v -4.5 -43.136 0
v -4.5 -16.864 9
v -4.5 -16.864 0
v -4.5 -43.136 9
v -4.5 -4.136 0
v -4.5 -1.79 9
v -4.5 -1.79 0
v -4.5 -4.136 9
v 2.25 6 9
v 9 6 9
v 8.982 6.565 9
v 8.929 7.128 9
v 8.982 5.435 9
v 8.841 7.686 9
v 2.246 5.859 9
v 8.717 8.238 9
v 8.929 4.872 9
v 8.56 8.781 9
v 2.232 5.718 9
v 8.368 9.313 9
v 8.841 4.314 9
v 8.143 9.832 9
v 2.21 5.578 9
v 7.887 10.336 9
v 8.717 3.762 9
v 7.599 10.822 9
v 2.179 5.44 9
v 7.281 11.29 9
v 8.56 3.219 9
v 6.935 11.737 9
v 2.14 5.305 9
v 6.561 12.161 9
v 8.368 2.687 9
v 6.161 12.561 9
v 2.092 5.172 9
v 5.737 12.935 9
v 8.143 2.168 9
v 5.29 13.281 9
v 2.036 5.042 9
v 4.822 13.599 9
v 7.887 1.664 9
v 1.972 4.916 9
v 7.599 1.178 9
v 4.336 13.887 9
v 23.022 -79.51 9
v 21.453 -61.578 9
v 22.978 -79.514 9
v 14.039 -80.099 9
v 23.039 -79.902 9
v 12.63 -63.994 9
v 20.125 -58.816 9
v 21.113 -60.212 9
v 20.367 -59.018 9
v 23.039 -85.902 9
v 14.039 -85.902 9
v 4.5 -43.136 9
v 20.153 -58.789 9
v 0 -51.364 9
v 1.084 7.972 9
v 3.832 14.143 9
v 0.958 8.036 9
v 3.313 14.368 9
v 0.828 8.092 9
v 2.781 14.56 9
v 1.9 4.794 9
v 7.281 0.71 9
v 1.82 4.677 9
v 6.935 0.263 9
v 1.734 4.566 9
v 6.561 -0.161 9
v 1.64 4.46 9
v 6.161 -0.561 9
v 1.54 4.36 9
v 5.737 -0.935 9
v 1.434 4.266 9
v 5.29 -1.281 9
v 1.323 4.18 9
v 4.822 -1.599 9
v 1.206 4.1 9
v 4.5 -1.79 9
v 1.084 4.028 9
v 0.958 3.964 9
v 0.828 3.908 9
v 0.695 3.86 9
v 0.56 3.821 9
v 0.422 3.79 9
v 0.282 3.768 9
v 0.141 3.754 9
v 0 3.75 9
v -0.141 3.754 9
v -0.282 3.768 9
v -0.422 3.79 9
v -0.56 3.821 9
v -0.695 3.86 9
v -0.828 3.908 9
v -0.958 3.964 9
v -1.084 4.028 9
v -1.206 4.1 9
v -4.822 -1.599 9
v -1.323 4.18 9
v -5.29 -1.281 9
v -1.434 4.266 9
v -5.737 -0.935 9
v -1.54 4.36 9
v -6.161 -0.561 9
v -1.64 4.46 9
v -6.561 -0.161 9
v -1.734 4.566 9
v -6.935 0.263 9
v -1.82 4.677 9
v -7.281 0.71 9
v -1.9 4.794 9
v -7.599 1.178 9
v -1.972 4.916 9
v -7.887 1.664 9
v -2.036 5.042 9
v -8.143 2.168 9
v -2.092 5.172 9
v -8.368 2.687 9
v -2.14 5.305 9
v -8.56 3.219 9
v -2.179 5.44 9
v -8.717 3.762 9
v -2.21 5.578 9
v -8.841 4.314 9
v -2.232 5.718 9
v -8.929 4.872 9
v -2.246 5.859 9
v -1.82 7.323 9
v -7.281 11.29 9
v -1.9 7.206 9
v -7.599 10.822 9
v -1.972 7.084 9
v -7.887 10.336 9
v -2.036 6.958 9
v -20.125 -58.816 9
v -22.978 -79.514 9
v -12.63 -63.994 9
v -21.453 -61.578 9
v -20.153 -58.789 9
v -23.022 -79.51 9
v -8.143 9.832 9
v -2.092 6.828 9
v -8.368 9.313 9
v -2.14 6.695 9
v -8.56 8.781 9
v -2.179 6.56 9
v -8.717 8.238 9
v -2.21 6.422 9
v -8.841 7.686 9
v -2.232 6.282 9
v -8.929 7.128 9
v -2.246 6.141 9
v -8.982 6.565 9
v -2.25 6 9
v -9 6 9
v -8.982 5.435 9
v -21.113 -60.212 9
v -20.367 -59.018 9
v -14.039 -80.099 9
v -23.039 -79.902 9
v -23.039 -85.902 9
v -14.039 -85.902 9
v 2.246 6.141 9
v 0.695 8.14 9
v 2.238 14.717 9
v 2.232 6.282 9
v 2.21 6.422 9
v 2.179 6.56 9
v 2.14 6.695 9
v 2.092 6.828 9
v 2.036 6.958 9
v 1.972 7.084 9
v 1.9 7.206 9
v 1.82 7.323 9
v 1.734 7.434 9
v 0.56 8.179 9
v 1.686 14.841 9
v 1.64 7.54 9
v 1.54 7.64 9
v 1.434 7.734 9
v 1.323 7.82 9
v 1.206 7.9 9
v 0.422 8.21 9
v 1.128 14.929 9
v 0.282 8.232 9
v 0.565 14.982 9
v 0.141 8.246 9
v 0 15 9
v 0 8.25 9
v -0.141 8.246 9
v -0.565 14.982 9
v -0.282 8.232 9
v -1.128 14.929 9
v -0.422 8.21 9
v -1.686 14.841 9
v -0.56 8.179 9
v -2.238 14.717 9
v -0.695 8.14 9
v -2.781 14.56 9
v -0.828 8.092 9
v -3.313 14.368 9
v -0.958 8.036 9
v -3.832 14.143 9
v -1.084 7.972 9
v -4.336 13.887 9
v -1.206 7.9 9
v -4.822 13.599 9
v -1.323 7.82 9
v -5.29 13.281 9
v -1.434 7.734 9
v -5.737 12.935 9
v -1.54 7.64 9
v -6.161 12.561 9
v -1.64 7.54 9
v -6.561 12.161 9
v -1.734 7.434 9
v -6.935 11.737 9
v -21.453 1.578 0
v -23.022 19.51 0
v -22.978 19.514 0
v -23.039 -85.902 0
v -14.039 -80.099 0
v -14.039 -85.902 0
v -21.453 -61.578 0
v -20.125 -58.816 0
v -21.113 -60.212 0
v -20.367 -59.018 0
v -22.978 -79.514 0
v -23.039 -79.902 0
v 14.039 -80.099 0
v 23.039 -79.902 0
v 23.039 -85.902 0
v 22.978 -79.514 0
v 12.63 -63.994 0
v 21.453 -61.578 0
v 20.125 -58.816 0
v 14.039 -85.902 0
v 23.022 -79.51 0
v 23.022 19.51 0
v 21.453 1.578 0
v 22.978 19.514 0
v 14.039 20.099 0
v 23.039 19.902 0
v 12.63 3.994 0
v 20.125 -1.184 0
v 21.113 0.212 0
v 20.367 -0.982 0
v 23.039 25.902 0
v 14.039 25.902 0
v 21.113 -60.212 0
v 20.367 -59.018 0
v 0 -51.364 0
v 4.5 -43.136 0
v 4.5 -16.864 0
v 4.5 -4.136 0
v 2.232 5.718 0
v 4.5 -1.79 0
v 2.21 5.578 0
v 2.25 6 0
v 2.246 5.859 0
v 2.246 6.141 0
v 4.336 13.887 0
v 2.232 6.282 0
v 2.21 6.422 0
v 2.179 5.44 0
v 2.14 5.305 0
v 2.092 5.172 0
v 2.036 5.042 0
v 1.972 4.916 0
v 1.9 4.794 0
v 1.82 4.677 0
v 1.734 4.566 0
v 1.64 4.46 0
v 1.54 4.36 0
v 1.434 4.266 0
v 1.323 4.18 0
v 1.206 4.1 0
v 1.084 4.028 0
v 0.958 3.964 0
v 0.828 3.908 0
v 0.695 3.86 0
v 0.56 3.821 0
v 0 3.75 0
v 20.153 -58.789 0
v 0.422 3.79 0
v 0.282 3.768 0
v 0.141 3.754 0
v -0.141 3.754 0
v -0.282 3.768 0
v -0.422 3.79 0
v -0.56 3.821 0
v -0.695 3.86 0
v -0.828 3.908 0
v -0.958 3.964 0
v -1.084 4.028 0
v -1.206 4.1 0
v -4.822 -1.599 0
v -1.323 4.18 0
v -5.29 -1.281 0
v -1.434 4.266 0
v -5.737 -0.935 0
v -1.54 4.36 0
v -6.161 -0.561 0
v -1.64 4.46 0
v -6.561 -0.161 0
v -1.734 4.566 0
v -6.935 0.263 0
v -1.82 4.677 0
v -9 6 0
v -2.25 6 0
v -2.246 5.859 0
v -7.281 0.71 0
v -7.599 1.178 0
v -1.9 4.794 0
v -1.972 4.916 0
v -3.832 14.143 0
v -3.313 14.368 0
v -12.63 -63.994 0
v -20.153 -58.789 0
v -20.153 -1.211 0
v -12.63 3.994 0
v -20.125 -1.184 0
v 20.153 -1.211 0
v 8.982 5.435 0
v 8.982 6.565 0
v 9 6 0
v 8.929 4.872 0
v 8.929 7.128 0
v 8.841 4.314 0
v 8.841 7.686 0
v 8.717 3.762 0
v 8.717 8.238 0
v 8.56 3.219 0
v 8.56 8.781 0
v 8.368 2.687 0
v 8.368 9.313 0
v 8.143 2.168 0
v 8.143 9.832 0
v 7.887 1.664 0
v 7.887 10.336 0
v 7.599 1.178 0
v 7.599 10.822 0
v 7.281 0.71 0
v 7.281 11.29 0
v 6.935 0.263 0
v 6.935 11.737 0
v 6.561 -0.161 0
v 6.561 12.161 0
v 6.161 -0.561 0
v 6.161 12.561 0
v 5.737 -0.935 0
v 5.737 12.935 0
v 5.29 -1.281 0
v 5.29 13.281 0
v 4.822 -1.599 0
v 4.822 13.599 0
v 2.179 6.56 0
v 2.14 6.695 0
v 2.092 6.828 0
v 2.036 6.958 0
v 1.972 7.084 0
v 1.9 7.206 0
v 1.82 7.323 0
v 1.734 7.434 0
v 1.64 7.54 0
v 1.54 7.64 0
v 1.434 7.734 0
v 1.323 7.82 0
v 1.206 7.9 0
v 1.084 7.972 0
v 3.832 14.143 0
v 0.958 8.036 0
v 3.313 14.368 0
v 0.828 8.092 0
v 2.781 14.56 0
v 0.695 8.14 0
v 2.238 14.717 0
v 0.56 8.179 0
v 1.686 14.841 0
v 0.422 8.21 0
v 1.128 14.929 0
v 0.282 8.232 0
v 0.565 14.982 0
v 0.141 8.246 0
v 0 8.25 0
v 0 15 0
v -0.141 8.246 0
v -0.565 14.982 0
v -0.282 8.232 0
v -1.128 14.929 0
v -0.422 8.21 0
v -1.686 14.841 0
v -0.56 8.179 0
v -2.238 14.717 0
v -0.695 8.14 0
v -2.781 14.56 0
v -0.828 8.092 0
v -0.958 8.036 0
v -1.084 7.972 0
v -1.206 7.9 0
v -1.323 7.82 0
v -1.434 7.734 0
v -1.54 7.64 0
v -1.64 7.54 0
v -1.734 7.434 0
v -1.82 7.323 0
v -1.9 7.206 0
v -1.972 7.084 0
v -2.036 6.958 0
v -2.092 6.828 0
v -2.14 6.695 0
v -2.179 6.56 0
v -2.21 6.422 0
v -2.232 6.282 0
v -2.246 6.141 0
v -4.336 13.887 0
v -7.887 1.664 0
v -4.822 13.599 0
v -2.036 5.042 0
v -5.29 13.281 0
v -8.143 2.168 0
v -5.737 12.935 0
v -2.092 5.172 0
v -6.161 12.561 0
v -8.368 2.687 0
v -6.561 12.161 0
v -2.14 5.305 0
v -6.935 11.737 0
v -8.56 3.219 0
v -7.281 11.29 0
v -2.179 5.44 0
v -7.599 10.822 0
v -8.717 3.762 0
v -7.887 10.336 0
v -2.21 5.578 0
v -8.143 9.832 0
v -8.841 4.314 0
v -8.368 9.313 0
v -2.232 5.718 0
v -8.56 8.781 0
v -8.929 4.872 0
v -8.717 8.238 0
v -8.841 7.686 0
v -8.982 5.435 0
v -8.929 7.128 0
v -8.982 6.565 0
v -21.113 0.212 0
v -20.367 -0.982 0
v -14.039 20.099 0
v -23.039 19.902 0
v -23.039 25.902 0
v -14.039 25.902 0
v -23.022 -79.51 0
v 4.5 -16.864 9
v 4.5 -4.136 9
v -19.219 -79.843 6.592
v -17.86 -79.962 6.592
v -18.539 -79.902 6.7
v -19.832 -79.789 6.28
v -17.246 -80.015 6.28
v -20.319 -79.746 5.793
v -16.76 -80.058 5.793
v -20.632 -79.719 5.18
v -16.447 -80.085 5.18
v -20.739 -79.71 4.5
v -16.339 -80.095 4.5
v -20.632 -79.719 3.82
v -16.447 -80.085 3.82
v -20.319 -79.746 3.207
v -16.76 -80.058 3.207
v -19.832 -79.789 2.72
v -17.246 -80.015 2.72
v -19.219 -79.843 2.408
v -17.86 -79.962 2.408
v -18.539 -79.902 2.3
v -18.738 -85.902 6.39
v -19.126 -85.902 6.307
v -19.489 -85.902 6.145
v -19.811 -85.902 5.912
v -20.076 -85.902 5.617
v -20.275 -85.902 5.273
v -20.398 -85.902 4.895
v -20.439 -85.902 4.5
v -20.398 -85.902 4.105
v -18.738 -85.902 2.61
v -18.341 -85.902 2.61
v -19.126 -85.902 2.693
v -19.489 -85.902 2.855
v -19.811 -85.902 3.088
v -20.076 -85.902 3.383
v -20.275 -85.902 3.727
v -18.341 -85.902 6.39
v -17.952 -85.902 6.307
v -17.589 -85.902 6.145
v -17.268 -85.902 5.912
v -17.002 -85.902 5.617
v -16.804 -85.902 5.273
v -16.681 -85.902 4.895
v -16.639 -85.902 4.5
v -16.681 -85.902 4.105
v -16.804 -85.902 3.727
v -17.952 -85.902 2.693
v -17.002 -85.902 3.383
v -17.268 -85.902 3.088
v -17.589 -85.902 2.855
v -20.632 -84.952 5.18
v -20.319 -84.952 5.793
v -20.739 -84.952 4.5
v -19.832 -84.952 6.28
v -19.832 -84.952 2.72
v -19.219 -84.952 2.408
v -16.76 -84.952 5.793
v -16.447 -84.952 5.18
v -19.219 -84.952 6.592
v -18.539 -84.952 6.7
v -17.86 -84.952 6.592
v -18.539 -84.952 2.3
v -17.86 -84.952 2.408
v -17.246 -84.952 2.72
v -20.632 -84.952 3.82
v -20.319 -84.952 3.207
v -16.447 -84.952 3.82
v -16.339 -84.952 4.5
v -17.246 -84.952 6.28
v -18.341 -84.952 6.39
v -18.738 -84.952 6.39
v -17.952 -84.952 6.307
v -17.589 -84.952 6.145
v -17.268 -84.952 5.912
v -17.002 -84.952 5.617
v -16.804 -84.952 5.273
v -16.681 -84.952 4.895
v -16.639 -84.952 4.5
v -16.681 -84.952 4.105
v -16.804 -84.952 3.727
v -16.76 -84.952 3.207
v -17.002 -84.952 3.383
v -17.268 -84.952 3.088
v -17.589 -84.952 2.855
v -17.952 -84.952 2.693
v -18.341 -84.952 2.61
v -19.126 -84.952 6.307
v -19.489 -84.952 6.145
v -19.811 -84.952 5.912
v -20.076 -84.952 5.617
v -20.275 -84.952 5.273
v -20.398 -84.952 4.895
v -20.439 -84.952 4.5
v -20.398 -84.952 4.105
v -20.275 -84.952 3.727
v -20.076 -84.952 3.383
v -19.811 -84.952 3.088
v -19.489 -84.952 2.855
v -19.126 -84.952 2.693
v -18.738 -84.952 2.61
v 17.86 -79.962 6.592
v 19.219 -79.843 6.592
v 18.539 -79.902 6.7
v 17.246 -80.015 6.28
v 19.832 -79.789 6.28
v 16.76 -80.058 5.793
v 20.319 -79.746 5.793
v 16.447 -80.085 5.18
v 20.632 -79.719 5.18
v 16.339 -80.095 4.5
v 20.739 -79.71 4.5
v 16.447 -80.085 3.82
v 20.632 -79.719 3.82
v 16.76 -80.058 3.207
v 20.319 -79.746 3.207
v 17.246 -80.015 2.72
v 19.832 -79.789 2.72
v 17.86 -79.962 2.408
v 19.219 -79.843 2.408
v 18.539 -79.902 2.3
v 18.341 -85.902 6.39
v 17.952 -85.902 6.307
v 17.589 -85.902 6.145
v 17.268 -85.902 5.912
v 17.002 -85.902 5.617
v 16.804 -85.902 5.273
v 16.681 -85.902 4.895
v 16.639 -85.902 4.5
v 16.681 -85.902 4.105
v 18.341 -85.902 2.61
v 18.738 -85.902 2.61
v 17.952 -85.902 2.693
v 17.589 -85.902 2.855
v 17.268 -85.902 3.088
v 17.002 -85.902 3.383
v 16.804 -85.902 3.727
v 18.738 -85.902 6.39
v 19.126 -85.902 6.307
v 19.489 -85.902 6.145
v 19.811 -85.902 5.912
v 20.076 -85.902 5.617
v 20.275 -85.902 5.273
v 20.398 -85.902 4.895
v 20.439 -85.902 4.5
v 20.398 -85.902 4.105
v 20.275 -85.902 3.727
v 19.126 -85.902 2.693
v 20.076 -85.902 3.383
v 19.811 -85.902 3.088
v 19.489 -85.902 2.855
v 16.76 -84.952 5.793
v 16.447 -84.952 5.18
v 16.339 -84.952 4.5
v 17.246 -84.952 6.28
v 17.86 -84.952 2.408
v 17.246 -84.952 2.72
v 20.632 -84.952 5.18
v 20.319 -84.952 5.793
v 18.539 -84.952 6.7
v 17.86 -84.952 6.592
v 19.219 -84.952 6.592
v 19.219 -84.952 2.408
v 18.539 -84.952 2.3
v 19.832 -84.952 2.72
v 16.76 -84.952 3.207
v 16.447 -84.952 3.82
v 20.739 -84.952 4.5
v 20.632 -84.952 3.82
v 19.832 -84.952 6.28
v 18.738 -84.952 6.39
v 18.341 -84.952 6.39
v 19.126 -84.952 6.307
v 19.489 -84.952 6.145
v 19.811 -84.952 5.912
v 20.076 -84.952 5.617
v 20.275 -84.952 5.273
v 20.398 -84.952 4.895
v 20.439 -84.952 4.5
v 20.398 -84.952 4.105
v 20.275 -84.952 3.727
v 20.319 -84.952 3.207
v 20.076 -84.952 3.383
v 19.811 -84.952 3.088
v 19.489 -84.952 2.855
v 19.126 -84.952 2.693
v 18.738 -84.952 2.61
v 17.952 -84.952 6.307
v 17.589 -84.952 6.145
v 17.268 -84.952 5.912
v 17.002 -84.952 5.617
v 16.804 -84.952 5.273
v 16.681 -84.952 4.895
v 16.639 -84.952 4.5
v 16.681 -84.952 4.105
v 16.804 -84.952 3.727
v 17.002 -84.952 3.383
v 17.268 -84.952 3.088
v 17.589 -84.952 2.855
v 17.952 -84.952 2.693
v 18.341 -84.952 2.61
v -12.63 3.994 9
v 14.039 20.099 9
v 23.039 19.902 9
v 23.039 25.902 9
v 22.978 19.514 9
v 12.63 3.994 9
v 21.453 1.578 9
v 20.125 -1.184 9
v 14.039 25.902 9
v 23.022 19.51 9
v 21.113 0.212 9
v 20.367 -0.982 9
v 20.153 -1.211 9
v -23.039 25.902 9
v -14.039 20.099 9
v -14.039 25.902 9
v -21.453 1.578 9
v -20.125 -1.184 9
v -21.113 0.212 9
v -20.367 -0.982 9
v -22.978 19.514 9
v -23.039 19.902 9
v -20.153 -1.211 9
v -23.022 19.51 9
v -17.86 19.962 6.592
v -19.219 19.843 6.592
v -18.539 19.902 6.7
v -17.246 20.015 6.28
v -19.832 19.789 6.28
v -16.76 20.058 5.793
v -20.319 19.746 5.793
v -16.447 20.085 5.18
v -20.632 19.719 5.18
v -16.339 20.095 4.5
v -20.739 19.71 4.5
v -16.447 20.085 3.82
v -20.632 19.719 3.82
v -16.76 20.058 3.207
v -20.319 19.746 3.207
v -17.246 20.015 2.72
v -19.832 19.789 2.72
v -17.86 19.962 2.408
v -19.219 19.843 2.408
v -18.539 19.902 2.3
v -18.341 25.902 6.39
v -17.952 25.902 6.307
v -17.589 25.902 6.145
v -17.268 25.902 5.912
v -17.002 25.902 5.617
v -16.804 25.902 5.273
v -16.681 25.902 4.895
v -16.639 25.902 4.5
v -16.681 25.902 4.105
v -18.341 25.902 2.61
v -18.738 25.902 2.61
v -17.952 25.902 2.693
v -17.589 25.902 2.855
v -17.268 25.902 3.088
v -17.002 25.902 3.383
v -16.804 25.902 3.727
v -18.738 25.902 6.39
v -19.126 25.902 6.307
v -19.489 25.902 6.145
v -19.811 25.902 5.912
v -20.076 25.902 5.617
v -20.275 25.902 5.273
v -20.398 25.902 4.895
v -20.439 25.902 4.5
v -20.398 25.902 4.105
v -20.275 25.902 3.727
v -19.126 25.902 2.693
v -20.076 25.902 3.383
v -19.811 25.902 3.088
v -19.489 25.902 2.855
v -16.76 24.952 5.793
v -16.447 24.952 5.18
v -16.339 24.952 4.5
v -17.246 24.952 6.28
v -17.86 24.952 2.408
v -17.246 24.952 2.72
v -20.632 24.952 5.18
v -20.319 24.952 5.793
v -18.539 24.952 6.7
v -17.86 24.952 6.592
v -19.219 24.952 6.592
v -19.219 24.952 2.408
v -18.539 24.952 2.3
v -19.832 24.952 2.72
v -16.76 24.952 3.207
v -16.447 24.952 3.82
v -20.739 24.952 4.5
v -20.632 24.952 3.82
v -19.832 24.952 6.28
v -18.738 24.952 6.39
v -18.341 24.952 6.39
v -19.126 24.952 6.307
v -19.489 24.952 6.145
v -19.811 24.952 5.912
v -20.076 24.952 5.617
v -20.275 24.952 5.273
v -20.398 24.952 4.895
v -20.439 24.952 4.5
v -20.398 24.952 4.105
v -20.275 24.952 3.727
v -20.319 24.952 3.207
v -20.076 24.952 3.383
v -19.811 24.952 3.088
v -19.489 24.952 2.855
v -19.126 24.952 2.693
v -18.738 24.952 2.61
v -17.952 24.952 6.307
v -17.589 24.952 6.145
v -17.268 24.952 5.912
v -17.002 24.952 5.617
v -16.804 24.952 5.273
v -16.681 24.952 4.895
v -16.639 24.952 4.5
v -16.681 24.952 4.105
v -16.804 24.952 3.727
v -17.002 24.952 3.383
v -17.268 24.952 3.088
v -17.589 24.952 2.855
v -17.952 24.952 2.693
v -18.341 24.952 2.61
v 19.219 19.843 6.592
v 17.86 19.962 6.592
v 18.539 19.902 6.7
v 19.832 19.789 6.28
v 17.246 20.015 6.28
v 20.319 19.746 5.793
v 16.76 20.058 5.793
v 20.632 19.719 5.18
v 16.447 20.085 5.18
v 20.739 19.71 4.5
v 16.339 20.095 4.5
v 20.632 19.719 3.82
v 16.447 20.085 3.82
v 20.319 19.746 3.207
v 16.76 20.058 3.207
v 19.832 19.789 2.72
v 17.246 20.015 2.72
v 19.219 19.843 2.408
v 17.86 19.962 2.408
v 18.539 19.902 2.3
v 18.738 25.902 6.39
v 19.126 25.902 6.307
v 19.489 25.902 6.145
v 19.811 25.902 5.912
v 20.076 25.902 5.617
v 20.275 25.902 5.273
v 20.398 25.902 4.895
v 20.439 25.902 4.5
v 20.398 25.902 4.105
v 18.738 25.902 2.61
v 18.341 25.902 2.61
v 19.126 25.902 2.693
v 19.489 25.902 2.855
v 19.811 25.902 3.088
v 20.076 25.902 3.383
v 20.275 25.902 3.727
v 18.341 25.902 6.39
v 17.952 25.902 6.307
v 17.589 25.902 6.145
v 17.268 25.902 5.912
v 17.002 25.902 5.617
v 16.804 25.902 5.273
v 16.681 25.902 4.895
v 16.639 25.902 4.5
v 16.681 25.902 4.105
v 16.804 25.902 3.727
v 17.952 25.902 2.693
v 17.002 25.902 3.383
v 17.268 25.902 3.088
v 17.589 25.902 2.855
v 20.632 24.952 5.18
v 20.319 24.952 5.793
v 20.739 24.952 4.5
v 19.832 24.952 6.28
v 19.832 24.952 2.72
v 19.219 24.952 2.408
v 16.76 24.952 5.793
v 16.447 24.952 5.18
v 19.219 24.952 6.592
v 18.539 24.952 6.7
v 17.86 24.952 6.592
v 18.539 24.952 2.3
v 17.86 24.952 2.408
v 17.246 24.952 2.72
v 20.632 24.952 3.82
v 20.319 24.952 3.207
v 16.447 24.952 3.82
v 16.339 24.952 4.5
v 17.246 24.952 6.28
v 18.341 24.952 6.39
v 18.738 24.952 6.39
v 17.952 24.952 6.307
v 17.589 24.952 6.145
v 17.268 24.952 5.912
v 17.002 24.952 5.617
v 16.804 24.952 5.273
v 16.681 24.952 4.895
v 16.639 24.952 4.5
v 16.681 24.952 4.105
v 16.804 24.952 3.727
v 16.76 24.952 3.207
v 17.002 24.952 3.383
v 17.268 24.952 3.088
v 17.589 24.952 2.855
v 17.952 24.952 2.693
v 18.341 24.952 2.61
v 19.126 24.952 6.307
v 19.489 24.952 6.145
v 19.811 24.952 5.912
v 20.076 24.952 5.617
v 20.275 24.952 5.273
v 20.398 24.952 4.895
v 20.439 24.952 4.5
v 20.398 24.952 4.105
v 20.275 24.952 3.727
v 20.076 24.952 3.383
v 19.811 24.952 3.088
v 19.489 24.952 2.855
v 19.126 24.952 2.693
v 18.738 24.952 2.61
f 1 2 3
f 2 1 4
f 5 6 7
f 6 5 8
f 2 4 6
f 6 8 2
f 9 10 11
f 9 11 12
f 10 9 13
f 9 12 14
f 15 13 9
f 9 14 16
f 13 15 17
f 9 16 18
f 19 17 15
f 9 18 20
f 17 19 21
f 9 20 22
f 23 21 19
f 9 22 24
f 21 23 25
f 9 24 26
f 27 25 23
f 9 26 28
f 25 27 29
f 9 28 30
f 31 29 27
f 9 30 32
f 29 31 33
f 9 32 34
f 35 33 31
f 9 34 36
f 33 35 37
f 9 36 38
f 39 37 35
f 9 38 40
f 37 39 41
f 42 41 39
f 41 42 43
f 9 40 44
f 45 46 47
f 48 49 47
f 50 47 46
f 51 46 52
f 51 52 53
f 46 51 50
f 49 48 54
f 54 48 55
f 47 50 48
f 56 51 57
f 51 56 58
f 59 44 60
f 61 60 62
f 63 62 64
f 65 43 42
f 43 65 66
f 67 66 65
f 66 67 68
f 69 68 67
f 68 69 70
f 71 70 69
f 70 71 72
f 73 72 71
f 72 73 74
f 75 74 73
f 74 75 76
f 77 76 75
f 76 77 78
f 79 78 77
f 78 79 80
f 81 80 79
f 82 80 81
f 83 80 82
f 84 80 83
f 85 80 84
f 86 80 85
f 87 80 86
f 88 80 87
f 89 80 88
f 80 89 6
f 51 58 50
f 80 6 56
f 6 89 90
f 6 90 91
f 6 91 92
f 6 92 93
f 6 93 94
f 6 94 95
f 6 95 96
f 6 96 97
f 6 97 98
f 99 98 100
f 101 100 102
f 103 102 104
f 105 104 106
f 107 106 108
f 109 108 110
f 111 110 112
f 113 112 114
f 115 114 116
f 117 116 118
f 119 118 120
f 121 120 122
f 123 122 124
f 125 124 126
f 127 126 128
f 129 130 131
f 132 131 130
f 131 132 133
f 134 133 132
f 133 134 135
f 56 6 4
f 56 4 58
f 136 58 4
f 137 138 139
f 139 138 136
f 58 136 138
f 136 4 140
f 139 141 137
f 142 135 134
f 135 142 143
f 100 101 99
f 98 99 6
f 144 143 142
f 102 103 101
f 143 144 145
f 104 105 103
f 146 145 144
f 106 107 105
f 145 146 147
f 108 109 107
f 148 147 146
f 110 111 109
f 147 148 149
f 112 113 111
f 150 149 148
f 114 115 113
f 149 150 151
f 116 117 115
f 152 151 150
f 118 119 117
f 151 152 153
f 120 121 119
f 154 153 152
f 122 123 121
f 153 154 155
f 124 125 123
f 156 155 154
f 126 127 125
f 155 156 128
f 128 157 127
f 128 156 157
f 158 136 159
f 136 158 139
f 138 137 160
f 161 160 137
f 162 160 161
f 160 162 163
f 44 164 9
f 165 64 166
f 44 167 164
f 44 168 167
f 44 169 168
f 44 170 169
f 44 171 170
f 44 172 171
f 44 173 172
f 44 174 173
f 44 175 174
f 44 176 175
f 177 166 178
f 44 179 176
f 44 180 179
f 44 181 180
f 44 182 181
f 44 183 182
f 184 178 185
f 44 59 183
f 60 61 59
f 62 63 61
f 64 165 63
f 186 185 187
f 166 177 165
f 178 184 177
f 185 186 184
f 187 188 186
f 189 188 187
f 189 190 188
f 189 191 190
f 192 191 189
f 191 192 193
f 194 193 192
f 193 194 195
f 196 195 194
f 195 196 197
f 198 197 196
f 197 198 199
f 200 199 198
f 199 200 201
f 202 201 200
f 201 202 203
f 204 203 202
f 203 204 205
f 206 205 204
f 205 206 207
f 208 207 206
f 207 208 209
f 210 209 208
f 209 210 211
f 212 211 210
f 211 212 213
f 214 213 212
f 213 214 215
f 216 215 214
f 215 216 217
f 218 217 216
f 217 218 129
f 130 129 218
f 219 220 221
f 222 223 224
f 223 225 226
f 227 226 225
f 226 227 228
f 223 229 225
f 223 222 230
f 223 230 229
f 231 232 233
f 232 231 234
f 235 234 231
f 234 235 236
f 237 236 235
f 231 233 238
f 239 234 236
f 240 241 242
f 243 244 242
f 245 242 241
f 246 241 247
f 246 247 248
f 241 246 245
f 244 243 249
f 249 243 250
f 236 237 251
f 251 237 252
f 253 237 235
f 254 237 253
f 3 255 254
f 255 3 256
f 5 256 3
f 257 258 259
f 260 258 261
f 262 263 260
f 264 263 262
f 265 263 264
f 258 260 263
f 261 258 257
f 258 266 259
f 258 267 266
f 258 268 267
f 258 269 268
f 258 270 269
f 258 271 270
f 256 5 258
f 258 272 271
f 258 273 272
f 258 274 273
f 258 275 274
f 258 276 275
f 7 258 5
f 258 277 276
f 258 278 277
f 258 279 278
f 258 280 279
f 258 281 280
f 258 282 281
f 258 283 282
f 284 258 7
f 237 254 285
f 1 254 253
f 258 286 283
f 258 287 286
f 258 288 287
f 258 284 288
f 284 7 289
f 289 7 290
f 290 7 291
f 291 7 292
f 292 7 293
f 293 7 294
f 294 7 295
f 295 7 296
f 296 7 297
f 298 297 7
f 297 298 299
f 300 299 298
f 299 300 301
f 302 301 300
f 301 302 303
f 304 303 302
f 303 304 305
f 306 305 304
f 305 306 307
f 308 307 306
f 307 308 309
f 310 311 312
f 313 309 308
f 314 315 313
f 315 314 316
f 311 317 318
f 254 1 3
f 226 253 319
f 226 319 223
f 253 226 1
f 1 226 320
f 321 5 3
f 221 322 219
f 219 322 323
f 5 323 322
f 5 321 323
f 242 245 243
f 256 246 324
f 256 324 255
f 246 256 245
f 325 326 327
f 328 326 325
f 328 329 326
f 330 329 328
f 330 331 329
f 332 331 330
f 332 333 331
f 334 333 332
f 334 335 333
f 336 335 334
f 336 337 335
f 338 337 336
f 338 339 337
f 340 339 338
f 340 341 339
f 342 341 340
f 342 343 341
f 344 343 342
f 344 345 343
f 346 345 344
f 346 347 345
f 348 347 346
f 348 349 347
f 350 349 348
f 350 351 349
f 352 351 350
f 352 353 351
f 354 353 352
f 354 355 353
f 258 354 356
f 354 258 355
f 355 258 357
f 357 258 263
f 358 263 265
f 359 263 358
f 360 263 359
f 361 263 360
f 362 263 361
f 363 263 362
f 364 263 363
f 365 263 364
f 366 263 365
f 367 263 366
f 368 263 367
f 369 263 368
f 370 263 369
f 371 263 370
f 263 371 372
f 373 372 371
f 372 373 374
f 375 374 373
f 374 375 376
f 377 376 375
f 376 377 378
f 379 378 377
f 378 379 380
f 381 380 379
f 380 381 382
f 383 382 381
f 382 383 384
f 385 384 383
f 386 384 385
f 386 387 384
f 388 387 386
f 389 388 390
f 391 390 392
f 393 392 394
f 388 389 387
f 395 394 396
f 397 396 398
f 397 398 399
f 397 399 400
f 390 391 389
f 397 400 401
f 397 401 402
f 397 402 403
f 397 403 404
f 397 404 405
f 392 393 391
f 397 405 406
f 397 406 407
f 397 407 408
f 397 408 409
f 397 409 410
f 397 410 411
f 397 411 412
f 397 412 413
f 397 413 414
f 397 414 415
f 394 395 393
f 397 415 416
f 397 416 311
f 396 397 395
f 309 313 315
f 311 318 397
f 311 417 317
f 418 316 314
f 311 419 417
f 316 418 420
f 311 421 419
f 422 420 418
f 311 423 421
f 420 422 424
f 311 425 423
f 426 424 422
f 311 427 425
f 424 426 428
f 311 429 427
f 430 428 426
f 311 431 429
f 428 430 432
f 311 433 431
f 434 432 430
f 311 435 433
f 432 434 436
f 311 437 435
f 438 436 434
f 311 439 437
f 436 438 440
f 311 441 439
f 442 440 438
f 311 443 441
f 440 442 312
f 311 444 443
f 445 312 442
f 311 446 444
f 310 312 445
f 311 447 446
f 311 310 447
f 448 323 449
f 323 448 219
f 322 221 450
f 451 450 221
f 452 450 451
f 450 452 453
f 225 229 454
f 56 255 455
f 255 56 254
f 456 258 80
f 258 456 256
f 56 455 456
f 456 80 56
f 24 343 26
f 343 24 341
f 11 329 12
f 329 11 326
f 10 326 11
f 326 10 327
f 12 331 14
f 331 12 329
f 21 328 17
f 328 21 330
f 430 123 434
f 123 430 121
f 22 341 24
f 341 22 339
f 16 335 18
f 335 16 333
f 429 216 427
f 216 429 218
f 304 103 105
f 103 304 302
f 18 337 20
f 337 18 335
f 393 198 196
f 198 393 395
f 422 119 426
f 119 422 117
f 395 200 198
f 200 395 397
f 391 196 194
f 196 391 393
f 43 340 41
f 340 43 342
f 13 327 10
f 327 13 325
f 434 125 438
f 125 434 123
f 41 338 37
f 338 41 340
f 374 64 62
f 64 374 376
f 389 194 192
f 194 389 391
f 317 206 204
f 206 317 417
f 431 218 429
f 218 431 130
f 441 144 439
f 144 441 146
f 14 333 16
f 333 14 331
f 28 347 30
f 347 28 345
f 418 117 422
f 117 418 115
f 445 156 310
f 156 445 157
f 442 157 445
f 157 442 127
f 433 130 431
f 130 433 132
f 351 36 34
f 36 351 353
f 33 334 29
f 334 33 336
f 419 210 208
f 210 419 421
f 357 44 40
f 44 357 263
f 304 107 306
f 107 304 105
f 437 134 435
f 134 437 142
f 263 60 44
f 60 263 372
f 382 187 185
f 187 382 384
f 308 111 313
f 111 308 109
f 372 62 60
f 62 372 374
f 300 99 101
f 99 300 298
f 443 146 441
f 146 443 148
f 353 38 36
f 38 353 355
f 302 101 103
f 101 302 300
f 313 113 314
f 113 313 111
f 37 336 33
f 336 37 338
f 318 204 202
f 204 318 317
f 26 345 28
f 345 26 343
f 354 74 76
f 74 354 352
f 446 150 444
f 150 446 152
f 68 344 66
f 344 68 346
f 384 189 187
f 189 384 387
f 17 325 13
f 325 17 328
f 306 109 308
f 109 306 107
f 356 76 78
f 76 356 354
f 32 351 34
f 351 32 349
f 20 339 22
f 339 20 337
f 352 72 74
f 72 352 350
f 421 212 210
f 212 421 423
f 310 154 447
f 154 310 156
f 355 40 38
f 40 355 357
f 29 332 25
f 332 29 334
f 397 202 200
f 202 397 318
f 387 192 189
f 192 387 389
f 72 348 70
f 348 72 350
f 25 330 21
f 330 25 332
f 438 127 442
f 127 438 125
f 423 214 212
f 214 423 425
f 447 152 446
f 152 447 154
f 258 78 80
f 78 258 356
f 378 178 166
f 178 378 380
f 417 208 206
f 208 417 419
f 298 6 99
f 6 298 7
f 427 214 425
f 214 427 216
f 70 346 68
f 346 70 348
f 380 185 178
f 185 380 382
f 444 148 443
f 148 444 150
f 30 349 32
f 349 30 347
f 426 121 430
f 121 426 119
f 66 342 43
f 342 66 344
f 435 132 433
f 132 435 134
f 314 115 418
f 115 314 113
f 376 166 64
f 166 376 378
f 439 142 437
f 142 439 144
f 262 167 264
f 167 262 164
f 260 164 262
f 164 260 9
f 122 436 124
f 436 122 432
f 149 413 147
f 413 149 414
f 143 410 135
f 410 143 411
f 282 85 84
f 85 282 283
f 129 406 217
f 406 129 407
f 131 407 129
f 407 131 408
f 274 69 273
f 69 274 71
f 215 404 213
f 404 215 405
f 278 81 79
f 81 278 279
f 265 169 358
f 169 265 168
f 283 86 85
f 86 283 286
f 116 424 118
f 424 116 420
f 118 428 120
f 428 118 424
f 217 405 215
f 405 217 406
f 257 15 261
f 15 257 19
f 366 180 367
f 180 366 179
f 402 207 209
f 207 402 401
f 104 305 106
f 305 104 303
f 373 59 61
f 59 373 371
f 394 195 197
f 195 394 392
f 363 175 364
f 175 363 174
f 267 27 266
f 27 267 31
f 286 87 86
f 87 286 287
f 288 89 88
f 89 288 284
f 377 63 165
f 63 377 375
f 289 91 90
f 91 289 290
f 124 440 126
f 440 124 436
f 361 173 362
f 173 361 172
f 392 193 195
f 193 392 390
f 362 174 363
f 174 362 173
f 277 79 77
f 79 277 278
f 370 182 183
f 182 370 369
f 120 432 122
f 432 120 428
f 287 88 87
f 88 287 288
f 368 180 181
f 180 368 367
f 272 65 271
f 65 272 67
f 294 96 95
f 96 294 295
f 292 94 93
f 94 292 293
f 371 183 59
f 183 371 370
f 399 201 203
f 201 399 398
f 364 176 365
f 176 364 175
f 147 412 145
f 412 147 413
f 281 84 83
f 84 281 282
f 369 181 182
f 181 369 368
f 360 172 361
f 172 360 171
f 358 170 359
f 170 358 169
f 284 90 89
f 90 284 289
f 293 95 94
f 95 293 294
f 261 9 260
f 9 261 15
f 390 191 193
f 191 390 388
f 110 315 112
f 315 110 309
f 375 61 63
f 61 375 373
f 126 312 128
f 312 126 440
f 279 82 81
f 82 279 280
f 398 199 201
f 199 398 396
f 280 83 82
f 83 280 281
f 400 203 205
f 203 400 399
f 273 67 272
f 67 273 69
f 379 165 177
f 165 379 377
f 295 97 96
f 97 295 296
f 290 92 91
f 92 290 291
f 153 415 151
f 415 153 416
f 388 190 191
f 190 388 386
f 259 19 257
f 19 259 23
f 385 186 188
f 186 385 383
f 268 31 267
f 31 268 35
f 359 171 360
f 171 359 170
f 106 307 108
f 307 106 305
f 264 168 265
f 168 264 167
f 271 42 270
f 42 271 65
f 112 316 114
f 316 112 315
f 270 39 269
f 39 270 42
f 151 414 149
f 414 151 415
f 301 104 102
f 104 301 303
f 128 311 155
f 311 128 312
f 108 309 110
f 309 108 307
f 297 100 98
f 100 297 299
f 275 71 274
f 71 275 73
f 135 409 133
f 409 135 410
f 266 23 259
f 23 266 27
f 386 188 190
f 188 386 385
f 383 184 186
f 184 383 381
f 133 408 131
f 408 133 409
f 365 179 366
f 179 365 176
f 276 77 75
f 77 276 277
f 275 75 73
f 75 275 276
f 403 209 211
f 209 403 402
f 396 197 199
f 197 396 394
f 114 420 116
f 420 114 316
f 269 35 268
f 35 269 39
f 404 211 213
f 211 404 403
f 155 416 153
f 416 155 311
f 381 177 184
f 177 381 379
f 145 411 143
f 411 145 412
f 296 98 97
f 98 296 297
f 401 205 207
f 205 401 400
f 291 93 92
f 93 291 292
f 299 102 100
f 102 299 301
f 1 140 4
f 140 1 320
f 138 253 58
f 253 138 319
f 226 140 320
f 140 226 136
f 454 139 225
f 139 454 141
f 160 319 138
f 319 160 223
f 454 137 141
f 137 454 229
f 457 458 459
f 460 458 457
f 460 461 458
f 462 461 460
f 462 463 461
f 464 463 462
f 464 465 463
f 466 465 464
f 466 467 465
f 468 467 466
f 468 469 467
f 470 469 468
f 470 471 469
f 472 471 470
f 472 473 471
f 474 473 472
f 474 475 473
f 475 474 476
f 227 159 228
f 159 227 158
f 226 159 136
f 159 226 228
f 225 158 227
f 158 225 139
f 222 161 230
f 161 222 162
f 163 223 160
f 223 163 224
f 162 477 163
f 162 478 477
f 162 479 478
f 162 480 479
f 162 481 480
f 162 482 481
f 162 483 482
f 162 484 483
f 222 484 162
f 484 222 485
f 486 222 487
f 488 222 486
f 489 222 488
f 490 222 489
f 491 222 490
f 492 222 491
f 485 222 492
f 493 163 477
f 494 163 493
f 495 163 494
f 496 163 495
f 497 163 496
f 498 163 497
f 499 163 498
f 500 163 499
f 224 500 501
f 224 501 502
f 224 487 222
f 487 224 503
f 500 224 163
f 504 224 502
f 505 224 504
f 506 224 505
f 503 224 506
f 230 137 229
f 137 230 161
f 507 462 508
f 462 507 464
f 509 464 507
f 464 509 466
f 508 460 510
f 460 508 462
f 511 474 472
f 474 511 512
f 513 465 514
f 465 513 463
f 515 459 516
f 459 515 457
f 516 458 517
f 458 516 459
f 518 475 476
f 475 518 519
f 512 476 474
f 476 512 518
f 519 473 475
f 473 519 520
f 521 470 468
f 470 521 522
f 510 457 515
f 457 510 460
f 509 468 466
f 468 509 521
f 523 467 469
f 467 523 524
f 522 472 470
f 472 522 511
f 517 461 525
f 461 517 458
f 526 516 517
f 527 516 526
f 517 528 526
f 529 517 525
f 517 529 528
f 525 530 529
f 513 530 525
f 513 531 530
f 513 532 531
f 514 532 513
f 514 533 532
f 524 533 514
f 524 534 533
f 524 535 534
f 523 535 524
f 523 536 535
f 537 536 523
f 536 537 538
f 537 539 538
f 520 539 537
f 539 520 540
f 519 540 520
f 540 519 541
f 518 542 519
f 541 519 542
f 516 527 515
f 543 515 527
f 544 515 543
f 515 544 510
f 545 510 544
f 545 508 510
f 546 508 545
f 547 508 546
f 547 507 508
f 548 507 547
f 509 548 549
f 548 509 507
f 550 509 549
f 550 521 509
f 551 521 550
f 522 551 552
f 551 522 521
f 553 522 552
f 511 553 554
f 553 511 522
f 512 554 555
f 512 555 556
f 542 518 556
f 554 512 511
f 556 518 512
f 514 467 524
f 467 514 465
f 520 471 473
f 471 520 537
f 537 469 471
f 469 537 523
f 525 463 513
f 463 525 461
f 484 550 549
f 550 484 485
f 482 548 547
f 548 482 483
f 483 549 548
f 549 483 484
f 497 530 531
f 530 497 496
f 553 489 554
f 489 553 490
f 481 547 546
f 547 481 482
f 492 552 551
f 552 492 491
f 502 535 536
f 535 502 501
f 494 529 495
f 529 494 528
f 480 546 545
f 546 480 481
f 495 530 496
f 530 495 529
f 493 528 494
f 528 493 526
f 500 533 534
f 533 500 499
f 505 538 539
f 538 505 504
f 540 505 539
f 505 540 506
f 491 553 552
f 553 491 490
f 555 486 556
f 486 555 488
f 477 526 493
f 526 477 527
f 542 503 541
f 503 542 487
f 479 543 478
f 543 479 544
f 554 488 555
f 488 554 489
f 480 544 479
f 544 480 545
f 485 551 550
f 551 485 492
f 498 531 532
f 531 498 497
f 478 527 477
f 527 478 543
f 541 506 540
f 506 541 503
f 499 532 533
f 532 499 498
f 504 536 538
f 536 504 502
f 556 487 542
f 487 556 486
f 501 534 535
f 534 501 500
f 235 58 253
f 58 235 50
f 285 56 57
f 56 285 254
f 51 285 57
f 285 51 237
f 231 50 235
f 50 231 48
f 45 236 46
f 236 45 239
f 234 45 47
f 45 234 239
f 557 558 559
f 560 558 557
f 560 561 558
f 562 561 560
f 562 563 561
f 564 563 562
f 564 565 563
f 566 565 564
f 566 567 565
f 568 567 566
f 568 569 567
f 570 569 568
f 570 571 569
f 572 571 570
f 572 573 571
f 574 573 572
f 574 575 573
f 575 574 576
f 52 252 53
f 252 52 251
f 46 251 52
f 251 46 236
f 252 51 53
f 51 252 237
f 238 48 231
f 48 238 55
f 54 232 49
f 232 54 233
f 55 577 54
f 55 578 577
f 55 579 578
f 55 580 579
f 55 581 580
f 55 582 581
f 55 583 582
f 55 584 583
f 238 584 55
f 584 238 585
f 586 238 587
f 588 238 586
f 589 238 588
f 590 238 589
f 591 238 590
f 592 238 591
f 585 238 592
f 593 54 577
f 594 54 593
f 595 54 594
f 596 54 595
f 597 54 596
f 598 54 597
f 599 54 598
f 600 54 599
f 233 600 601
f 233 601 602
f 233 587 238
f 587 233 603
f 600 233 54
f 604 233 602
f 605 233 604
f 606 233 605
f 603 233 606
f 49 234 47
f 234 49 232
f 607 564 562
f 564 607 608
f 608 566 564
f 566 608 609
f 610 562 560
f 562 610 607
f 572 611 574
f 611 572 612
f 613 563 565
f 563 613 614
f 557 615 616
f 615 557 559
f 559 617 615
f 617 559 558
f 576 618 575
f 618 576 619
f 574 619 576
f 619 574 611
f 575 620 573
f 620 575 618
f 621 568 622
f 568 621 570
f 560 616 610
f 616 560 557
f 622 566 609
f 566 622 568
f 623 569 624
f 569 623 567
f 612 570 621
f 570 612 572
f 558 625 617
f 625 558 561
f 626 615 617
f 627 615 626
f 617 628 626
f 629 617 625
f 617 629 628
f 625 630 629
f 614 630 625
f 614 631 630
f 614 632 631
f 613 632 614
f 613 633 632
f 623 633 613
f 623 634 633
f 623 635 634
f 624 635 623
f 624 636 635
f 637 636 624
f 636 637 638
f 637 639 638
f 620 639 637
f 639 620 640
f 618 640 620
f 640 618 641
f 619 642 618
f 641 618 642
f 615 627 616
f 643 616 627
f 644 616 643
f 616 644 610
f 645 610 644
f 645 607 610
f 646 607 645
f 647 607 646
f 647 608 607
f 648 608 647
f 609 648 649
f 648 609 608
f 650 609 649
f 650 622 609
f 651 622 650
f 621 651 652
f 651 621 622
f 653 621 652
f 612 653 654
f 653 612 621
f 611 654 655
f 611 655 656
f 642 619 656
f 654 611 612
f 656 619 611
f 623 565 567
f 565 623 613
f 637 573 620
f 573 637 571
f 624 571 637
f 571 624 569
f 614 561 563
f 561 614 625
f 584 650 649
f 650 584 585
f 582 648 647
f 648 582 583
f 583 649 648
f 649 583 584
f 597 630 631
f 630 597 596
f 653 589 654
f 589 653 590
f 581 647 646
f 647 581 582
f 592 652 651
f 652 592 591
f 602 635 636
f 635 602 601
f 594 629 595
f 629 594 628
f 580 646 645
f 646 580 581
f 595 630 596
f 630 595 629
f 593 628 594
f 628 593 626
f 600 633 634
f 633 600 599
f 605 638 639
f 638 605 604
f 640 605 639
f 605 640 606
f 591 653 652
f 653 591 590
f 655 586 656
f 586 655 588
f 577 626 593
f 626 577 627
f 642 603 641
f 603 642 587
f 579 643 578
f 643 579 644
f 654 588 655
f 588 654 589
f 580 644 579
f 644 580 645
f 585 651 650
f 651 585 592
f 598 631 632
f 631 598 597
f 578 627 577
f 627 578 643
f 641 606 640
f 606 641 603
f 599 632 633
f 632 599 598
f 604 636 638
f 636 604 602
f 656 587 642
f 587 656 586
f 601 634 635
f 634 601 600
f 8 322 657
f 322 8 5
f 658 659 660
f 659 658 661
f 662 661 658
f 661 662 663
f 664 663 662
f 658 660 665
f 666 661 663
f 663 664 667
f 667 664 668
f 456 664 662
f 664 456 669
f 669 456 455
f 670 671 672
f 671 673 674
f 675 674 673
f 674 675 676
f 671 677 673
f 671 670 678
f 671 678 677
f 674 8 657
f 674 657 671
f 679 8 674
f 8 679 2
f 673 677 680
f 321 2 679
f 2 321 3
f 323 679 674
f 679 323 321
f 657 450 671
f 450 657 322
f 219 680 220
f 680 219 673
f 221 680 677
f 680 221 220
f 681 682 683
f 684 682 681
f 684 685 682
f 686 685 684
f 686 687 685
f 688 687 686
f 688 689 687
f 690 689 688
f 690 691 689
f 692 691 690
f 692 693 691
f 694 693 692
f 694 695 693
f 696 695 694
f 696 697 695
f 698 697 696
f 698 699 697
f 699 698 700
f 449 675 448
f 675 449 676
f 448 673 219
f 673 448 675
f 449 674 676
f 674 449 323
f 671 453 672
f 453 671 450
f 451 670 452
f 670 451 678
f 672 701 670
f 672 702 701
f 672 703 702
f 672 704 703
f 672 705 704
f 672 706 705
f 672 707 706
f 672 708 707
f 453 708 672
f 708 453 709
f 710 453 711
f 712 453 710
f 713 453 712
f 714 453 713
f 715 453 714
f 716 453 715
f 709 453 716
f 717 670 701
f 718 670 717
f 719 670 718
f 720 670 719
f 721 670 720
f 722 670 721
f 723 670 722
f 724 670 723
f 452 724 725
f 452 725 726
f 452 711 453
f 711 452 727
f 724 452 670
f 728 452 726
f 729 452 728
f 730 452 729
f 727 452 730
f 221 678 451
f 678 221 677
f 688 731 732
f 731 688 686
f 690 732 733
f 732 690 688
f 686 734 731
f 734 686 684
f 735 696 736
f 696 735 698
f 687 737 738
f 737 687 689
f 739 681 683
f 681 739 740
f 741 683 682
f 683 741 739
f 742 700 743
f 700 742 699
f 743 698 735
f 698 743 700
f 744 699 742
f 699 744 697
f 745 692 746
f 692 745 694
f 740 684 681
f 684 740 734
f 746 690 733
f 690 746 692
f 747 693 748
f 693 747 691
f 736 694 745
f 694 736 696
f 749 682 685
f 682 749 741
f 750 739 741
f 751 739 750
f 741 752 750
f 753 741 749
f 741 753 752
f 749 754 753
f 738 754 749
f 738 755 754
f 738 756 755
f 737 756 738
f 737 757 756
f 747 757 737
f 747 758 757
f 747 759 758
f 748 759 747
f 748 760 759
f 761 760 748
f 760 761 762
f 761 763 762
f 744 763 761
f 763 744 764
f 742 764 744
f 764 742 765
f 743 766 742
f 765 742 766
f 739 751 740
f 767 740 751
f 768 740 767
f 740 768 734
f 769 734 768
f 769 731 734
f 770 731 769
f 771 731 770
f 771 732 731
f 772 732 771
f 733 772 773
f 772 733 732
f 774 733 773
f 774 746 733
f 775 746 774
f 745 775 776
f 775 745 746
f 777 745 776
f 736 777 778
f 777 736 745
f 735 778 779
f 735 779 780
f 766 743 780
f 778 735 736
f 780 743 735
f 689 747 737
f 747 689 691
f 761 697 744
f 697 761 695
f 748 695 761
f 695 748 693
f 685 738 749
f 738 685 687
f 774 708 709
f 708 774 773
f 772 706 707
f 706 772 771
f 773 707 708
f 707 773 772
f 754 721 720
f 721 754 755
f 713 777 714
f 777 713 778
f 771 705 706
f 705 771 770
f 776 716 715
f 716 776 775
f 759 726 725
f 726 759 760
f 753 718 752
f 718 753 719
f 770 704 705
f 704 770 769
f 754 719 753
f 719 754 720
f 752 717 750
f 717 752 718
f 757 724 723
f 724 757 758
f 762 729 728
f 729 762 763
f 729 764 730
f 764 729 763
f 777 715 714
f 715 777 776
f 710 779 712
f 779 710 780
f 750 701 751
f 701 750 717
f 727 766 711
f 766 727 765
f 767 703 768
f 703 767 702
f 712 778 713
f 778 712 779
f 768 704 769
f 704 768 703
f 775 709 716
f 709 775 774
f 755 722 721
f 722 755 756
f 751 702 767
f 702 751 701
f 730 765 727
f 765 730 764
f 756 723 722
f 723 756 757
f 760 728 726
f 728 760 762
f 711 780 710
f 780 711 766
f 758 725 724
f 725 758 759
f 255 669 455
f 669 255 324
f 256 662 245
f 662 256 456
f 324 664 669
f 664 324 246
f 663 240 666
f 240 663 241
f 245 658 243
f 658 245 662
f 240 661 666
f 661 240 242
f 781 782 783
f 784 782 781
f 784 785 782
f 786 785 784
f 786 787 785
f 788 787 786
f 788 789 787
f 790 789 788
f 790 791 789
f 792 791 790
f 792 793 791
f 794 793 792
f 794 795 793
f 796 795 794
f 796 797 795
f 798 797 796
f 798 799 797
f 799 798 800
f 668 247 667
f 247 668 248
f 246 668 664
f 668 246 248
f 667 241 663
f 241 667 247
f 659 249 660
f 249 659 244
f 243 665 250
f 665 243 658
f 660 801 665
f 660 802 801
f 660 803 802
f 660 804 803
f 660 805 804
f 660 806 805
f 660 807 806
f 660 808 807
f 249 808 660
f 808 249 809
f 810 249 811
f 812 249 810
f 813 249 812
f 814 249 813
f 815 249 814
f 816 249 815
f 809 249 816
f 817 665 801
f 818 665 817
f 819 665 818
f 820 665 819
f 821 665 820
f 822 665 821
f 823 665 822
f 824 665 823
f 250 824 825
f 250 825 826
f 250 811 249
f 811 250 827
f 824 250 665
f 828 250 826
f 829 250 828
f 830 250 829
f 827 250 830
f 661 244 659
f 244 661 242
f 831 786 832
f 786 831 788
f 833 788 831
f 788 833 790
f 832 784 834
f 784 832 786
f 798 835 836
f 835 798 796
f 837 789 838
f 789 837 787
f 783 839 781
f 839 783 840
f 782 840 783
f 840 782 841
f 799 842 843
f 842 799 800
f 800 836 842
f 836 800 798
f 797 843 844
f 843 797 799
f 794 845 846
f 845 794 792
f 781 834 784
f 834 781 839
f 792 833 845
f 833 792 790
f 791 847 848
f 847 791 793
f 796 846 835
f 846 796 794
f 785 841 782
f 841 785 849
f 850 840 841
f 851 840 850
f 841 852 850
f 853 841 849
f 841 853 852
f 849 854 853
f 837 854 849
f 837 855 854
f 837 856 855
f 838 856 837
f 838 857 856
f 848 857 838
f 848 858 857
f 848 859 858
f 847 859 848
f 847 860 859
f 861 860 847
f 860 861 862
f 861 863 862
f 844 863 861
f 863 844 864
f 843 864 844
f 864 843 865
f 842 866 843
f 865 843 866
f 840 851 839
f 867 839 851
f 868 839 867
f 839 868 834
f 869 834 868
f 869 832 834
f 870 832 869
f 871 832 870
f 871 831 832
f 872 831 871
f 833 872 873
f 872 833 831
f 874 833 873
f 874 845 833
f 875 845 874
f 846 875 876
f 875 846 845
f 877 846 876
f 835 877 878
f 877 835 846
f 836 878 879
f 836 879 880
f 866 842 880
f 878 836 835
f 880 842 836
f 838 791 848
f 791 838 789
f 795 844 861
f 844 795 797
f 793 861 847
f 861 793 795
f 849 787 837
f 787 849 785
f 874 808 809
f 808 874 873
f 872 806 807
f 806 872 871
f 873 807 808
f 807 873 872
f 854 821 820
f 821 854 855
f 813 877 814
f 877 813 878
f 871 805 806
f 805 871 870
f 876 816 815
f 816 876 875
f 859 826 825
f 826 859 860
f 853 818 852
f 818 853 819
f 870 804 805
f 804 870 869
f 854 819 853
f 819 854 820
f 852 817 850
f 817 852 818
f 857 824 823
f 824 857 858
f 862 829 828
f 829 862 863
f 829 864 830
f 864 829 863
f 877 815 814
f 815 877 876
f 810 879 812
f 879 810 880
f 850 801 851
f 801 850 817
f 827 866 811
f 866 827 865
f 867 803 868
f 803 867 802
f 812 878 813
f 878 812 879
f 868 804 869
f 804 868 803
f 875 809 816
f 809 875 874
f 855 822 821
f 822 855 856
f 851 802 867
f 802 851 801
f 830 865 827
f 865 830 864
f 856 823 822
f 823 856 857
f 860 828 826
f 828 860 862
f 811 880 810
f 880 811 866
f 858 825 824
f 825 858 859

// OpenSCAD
// ==================================================
// Stick Man - Customizer
// Created by Daiju Watanbe ( Daizyu ).
// 2 April 2016. 
// =================================================

/* MODIFIED VERSION BY Daniel K. Schneider
   January 2017
   - removed base
   - changed default parameters
   - added holes in feet and hands to insert 5x5mm cylindrical magnets
   
   Tips: 
   - The sum of each arm or foot limb angles should be 180.
   - Magnet diameter should be a bit smaller than the magnet if printed with TPE
   - magnet_entry_extra_width = -0.6; and magnet_entry_extra_height = 1; // add a bottle neck
   - Set the magnet_entry_extra_* values to zero if you plan to glue the magnet.
*/

// preview[view:south, tilt:top]

/* [Angle] */
upper_arm_l = -135;               // [-360:360]
lower_arm_l = -40;               // [-360:360]
hand_l = -5;               // [-360:360]
upper_arm_r = 135;               // [-360:360]
lower_arm_r = 40;               // [-360:360]
hand_r = 5;               // [-360:360]
thigh_l = -45;               // [-360:360]
shin_l = 40;               // [-360:360]
foot_l = 5;               // [-360:360]
thigh_r = 45;               // [-360:360]
shin_r = -40;               // [-360:360]
foot_r = -5;               // [-360:360]
body = 0;               // [-360:360]

/* [Basic] */
b_thickness = 9;
thickness = 9;

/* [Magnet holes] */
magnet_diameter = 4.4;
magnet_entry_extra_width = -0.6; // [-1:0]
magnet_entry_extra_height = 1; // [0:1]
magnet_height = 5; // [1:5]

/* [Head] */
fill_head = false;
head_diameter = 18;
head_offset_x = 0;
head_offset_y = 6;
head_hole_diameter = 4.5;

/* [Body] */
body_length = 36;

/* [Heart] */
heart_diameter = 0;
heart_offset_y = 0;

/* [Left arm] */
arm_l_offset = 6;
upper_arm_l_length = 24;
lower_arm_l_length = 18;
hand_l_length = 6;

/* [Right arm] */
arm_r_offset = 6;
upper_arm_r_length = 24;
lower_arm_r_length = 18;
hand_r_length = 6;

/* [Left Leg] */
thigh_l_length = 24;
shin_l_length = 18;
foot_l_length = 6;

/* [Right Leg] */
thigh_r_length = 24;
shin_r_length = 18;
foot_r_length = 6;

/* [Legs and hands] */
paw_extra_width = 0;
paw_extra_height = 0;

/* [resolution] */
base_fn = 120;
head_fn = 100;

module bone(length){
     {
	  translate([-thickness/2,0,0])
	       cube(size = [thickness,length,b_thickness], center = false);
     }
     cylinder(h=b_thickness, r=thickness/2, center=false ,$fn=20);
}

module handFootBone(length){
     {
	  difference () {
	       union () {
		    translate([-(thickness+paw_extra_width)/2,0,0])
			 cube(size = [thickness+paw_extra_width,length,b_thickness+paw_extra_width], center = false);
		    cylinder(h=b_thickness+paw_extra_width, r=(thickness+paw_extra_width)/2, center=false ,$fn=20);
	       }
	       // magnet hole
	       translate ([0,length-magnet_entry_extra_height+0.05,(b_thickness+paw_extra_width)/2])
		    rotate ([90,0,0])
		    cylinder(h=magnet_height+0.5, r=magnet_diameter/2, center=false ,$fn=20);
               // bottleneck at entry
	       translate ([0,length+0.05,(b_thickness+paw_extra_width)/2])
		    rotate ([90,0,0])
		    cylinder(h=magnet_entry_extra_height+0.05, r=(magnet_diameter + magnet_entry_extra_width)/2, center=false ,$fn=30);
	  }
     }
}

module branch(
     head_diameter,
     Degrees1,Length1,
     Degrees2,length2,
     Degrees3,length3,
     Degrees4,length4,
     )
{
     rotate(Degrees1,[0,0,1])
	  translate([0,Length1+head_diameter/2,0])
	  rotate(Degrees2,[0,0,1])
     {
	  bone(length2);

	  translate([0,length2,0])
	       rotate(Degrees3,[0,0,1])
	  {
	       bone(length3);

	       translate([0,length3,0])
		    rotate(Degrees4,[0,0,1])
	       {
		    handFootBone(length4);
	       }
	  }
     }
}

module headBody() {
     union(){
	  translate([head_offset_x,head_offset_y,0])
	       cylinder(h=b_thickness, r=head_diameter/2.0, center=false ,$fn=head_fn);
	  rotate(body+180,[0,0,1])
	       bone(body_length+head_diameter/2);	
     }
}



difference ()
{

     union()
     {
	  if ( fill_head ) 
	  {
	       headBody();
	  }else{
	       difference()
	       {
		    headBody();
		    translate([head_offset_x,head_offset_y,-1])
			 #cylinder(h=b_thickness+2, r=head_hole_diameter/2, center=false ,$fn=head_fn);
			 }
	  }
     
	  branch(head_diameter,
		 body+180,body_length,
		 thigh_l,thigh_l_length,
		 shin_l,shin_l_length,
		 foot_l,foot_l_length
	       );
     
	  branch(head_diameter,
		 body+180,body_length,
		 thigh_r,thigh_r_length,
		 shin_r,shin_r_length,
		 foot_r,foot_r_length
	       );

	  branch(head_diameter,
		 body+180,arm_l_offset,
		 upper_arm_l,upper_arm_l_length,
		 lower_arm_l,lower_arm_l_length,
		 hand_l,hand_l_length
	       );

	  branch(head_diameter,
		 body+180,arm_r_offset,
		 upper_arm_r,upper_arm_r_length,
		 lower_arm_r,lower_arm_r_length,
		 hand_r,hand_r_length
	       );
     }
     translate([0,-body_length/2-heart_offset_y,-1])
	  # cylinder(h=b_thickness+2, r=heart_diameter/2, center=false ,$fn=head_fn);
	  }
